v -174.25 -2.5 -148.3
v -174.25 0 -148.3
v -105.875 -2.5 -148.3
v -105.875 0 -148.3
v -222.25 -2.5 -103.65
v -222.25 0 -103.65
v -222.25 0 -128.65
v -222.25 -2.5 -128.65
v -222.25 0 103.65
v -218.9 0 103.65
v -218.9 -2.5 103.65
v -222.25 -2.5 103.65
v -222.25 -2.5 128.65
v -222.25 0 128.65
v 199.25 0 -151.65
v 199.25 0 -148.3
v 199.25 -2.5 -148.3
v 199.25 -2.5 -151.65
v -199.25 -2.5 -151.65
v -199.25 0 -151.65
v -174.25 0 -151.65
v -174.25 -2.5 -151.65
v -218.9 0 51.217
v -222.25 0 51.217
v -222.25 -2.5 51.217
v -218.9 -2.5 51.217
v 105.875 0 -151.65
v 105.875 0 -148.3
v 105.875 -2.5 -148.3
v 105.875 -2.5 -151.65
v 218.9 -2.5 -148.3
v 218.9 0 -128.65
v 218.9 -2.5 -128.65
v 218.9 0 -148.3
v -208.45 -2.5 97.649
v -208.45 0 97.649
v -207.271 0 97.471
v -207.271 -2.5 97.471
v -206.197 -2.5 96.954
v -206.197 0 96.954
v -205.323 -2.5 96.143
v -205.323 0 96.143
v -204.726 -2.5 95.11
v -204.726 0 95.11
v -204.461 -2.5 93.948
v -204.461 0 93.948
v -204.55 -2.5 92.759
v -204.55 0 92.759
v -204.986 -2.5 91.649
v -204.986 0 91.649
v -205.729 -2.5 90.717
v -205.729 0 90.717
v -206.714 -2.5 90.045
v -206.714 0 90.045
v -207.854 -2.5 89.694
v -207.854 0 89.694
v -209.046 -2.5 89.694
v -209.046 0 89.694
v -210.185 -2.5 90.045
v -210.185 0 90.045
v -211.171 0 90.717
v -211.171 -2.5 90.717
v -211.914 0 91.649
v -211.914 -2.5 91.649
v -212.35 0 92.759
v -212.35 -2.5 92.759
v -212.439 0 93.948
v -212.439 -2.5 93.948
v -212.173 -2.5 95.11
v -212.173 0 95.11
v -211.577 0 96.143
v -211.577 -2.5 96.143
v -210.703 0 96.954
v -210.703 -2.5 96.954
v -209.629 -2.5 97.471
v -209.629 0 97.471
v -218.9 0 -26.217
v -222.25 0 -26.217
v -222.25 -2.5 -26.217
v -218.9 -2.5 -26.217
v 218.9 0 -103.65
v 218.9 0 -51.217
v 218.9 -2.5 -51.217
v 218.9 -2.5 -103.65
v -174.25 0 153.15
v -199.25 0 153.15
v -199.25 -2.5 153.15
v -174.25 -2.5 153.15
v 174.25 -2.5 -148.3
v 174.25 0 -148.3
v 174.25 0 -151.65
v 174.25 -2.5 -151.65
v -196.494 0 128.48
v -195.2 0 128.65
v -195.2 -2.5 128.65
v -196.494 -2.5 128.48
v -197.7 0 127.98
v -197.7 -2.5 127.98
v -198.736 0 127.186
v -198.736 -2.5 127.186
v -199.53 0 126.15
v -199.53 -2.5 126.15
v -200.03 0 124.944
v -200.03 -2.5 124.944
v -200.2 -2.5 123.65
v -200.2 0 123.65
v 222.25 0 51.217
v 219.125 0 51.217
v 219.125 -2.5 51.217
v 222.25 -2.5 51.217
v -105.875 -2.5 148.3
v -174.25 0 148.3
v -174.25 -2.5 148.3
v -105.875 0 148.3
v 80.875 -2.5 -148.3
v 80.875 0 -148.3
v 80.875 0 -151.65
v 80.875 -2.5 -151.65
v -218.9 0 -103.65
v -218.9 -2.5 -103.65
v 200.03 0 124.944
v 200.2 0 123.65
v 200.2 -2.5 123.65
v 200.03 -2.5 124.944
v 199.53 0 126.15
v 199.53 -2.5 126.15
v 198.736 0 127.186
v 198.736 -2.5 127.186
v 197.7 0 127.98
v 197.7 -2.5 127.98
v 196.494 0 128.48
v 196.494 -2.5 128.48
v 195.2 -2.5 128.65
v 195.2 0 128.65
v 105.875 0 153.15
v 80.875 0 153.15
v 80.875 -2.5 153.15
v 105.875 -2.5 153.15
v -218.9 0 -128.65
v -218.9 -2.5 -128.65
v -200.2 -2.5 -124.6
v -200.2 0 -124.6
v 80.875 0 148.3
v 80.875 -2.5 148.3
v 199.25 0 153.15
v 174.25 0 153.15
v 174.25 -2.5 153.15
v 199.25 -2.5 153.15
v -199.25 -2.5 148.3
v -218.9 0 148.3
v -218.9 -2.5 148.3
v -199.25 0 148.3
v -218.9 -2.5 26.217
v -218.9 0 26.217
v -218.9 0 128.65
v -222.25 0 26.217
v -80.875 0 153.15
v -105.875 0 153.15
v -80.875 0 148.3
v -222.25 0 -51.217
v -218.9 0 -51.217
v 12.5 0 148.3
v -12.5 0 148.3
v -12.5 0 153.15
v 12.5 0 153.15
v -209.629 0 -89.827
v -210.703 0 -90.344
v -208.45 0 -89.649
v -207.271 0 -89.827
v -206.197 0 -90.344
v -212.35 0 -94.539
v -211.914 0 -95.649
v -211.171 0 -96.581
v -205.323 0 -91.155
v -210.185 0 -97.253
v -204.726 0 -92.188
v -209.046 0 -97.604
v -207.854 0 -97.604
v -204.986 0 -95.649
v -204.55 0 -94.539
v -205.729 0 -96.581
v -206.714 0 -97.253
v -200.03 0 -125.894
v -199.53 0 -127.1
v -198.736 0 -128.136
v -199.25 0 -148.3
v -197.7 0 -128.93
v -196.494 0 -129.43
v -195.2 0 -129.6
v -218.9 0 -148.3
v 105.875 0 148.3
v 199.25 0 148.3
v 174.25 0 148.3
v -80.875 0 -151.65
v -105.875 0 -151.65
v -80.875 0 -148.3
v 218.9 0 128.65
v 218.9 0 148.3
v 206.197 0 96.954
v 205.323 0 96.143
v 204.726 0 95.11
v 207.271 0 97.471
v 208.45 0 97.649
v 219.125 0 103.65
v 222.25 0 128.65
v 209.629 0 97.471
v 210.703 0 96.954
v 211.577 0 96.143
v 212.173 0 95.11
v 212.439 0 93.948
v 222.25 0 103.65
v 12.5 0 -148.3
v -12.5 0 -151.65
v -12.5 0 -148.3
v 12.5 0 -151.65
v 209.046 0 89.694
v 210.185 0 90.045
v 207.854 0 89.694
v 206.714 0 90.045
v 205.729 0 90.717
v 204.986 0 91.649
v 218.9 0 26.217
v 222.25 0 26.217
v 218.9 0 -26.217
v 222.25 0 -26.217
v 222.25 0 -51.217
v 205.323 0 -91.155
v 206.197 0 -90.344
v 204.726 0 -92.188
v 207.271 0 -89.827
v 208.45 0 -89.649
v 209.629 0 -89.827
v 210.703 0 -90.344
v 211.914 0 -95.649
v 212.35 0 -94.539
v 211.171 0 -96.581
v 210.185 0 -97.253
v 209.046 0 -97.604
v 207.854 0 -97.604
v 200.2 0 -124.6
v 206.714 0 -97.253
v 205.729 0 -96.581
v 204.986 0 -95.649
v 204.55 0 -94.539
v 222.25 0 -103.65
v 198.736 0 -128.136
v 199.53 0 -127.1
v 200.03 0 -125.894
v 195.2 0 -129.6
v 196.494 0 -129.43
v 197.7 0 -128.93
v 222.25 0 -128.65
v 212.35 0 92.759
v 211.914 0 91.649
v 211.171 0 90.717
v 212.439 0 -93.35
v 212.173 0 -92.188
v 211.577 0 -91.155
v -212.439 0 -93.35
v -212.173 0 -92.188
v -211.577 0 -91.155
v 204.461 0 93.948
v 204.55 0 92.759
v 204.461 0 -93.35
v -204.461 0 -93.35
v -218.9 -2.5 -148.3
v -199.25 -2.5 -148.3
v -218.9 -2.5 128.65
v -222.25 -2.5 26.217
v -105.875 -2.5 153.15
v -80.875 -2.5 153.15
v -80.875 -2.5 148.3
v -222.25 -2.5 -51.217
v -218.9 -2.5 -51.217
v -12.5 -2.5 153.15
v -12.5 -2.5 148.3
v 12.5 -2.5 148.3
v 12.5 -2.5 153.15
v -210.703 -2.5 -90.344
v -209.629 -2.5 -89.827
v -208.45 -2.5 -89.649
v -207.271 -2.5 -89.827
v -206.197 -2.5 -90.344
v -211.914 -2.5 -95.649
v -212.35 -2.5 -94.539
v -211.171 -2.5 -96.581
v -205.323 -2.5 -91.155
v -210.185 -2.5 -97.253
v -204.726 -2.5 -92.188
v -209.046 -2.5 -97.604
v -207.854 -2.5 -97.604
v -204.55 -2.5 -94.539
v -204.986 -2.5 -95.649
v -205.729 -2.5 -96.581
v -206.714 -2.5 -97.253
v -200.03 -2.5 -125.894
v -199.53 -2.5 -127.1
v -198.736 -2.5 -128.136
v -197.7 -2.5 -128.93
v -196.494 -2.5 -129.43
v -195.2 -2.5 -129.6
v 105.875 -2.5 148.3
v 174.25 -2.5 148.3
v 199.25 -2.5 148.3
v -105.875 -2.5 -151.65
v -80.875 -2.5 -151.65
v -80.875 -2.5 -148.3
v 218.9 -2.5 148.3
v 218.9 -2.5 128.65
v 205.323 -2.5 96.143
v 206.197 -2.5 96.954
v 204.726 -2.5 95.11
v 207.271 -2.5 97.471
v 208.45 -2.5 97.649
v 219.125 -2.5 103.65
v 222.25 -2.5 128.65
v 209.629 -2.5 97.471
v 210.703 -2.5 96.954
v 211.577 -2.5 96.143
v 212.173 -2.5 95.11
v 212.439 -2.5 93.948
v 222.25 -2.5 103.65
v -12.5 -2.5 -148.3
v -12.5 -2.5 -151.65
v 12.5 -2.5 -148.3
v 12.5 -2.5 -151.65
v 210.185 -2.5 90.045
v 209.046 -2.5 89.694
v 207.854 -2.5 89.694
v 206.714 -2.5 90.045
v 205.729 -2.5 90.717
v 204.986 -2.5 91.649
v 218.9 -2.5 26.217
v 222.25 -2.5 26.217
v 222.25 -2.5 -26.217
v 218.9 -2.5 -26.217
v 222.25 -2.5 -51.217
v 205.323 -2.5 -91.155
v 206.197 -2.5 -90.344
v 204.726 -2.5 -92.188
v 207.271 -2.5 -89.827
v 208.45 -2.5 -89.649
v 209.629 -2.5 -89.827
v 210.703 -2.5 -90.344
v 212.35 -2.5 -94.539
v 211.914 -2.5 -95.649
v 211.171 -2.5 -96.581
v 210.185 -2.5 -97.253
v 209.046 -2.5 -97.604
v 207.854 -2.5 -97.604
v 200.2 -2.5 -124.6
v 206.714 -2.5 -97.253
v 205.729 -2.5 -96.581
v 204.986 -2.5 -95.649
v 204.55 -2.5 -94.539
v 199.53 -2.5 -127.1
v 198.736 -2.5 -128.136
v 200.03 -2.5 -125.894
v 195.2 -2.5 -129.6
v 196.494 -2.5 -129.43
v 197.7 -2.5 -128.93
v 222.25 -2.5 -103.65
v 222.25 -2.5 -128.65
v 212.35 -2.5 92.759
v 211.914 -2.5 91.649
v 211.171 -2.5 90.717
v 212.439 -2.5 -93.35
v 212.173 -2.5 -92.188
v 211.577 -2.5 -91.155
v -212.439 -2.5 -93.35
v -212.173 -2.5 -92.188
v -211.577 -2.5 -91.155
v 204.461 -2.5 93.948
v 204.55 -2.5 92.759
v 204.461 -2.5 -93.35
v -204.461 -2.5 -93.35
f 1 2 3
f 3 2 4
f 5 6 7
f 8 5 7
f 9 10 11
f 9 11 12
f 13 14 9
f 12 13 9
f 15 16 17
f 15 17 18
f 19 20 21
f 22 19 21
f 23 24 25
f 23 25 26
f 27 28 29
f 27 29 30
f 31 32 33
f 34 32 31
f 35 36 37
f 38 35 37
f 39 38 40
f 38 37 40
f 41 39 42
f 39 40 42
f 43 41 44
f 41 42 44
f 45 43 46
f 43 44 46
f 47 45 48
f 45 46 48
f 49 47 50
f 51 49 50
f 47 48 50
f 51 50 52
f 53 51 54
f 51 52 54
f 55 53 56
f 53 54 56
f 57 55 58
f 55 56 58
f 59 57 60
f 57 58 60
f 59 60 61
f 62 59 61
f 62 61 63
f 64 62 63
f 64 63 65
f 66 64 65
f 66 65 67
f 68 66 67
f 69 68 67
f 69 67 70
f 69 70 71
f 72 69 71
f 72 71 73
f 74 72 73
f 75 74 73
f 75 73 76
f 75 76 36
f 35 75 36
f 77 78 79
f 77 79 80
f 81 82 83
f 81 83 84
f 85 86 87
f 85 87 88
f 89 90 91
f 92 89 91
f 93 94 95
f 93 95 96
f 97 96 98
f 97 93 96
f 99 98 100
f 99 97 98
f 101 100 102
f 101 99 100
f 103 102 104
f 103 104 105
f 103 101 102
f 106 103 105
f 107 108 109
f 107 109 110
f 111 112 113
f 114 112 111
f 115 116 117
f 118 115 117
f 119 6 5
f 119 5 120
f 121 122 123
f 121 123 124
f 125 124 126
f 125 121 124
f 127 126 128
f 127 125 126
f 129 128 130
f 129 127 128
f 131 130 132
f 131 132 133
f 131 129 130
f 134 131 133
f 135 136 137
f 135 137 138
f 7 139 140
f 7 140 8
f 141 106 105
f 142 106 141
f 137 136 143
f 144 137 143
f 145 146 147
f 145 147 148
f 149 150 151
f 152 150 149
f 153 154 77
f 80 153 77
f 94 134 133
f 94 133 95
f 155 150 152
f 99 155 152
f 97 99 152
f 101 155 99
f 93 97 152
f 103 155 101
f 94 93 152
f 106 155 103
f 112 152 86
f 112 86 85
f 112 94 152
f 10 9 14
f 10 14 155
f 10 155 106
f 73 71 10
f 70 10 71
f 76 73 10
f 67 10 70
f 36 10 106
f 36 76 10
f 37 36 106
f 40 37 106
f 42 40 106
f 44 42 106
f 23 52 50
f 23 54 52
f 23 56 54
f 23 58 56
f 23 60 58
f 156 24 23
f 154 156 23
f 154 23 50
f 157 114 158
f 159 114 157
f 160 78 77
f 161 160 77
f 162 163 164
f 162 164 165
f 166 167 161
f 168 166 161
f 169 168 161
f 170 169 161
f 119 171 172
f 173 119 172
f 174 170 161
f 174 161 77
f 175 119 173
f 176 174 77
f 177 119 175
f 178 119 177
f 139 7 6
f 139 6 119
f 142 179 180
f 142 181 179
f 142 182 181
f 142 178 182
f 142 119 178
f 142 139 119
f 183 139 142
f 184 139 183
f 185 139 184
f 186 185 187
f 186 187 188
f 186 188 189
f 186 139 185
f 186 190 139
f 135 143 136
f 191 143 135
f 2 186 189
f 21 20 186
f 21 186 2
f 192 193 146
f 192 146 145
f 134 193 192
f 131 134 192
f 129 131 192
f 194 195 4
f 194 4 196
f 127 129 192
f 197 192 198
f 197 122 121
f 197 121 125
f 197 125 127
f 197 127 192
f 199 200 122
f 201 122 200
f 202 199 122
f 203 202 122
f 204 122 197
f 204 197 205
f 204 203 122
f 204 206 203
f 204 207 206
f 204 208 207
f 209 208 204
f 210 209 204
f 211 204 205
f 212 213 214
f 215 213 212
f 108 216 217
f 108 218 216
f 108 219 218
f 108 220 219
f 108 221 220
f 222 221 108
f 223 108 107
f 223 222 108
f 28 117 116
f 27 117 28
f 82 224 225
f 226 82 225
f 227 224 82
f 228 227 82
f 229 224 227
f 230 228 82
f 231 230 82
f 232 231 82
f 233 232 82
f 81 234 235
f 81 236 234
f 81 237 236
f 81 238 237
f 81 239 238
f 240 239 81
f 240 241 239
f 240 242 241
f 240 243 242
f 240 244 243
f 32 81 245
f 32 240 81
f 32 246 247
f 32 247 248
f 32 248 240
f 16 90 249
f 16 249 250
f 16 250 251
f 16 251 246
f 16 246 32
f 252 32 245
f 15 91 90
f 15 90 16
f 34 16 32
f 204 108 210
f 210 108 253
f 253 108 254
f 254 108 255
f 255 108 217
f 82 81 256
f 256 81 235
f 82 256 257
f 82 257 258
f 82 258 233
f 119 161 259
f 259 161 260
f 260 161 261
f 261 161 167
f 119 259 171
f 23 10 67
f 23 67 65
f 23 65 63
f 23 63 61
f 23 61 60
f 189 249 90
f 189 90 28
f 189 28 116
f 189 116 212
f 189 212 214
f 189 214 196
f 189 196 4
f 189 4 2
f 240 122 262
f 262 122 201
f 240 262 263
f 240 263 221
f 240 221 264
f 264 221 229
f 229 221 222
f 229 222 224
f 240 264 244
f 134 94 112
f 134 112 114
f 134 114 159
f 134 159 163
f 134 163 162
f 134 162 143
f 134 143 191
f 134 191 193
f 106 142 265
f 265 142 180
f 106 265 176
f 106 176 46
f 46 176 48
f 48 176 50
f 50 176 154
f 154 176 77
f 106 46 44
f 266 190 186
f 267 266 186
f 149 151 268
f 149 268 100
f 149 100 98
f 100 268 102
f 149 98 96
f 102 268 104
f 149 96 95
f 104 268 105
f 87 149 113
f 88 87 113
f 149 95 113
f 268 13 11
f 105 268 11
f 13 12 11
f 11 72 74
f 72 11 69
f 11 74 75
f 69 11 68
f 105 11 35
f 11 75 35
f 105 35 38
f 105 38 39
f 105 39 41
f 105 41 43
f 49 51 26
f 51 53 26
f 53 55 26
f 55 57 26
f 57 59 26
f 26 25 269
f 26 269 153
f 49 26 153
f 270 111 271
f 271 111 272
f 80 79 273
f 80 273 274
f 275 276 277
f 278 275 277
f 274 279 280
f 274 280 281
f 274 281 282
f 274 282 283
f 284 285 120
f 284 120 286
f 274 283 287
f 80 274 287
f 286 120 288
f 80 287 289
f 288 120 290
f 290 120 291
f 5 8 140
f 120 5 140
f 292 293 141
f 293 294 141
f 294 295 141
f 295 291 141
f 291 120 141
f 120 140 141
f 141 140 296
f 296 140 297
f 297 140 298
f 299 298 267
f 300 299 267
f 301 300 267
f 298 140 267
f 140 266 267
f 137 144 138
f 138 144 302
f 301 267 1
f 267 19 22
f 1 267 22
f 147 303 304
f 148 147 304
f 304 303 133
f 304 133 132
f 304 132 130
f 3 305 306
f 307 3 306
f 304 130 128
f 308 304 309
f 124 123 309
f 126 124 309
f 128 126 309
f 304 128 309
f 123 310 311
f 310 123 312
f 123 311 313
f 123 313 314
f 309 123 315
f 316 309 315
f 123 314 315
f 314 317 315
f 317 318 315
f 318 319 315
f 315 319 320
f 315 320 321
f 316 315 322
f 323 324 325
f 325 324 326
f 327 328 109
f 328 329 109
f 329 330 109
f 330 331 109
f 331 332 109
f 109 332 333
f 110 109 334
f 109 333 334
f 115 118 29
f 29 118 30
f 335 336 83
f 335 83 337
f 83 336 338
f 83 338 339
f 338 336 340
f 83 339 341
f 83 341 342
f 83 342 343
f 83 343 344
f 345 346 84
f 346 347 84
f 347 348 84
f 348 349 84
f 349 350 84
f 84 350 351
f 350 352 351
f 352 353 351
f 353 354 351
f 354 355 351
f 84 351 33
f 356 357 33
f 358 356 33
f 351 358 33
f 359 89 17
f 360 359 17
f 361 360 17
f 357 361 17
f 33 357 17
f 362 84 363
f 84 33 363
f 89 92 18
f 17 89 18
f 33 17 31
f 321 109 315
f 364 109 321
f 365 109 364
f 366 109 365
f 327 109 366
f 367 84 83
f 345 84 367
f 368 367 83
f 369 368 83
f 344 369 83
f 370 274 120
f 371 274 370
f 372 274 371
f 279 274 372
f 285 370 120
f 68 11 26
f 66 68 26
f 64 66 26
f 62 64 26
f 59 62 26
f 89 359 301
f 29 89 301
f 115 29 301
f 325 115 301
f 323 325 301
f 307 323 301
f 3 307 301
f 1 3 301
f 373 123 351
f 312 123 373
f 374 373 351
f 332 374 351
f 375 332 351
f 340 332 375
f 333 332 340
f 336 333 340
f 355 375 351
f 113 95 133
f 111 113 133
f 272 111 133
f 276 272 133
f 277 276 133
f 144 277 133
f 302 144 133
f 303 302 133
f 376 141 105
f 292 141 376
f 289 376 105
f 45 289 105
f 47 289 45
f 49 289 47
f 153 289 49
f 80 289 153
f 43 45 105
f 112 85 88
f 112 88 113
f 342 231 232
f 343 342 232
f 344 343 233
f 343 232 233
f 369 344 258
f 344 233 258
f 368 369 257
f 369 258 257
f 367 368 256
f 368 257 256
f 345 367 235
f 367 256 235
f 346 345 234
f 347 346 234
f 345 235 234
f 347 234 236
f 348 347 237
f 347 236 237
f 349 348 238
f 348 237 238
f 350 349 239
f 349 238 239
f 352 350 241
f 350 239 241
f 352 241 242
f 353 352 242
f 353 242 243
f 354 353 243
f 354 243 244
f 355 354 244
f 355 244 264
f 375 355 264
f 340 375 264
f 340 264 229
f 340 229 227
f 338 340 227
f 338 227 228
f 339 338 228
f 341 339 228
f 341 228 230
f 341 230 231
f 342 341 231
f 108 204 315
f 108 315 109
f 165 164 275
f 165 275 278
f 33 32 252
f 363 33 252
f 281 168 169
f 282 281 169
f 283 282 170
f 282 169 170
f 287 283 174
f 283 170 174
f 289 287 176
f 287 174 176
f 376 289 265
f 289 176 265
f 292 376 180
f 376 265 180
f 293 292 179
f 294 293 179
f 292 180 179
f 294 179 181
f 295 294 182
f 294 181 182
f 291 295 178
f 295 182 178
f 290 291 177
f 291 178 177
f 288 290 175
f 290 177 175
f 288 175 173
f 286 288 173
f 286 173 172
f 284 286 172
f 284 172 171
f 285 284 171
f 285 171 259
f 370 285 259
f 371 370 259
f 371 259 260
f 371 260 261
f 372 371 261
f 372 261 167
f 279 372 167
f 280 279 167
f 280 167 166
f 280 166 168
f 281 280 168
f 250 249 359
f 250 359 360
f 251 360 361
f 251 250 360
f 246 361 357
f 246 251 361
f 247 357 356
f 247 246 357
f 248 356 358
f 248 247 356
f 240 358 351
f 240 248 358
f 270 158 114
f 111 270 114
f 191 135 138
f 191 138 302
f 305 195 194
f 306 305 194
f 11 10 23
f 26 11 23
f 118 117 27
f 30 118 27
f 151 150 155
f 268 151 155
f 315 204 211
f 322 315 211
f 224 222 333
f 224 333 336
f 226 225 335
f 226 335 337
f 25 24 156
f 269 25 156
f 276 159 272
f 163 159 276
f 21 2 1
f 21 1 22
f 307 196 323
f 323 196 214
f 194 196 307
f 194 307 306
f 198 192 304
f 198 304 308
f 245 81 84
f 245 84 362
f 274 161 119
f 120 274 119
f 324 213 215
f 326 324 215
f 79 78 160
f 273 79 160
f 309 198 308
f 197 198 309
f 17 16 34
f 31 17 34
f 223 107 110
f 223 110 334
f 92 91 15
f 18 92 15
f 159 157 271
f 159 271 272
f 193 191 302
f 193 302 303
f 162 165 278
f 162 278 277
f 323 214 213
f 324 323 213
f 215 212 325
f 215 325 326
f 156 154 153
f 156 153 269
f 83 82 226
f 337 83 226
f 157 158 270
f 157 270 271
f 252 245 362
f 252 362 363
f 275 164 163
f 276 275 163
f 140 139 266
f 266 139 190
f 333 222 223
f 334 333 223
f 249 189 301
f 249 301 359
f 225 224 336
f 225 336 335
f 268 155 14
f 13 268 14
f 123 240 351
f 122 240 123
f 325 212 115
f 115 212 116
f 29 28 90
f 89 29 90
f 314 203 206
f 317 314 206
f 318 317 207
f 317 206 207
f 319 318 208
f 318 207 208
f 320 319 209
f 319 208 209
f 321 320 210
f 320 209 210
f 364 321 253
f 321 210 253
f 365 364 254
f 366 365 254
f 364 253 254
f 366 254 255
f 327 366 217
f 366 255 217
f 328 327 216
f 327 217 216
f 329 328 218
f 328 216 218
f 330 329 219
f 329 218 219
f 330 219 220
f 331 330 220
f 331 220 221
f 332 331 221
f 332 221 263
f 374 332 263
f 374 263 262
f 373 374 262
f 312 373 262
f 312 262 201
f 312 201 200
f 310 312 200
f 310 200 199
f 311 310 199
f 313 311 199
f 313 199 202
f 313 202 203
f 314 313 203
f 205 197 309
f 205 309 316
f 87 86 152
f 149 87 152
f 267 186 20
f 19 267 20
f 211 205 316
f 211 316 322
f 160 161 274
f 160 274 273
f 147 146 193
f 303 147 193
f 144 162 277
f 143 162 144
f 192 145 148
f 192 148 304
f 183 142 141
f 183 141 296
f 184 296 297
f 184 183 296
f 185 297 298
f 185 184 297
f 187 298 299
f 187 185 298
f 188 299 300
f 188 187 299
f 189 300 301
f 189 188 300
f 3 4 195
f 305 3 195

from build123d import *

# Parameters (mm, degrees)
SKETCH1_W           = 438.5
SKETCH1_H           = 297.3
BASE_FLANGE1_DEPTH  = 2.5
SKETCH6_W           = 3
SKETCH6_H           = 25
BOSS_EXTRUDE1_DEPTH = 2.5
SKETCH8_W           = 25
SKETCH8_H           = 4.5
BOSS_EXTRUDE2_DEPTH = 2.5
SKETCH9_W           = 25
SKETCH9_H           = 3
BOSS_EXTRUDE3_DEPTH = 2.5
SKETCH10_W          = 0.35
SKETCH10_H          = 19.65
SKETCH10_W_2        = 20
SKETCH10_H_2        = 0.35
SKETCH10_H_3        = 52.4334
SKETCH10_H_4        = 20
SKETCH10_W_3        = 19.65
SKETCH10_W_4        = 68.375
SKETCH10_W_5        = 0.125
SKETCH10_H_5        = 52.4333
CUT_EXTRUDE1_DEPTH  = 10
SKETCH11_R          = 4
CUT_EXTRUDE2_DEPTH  = 3.05


# Sheet-metal steps are written as plain solids
with BuildPart() as part:
    # Sketch1 → Base-Flange1 (new body)
    with BuildSketch(Plane(origin=(0, 0, 0), x_dir=(1, 0, 0), z_dir=(0, 1, 0))):
        Rectangle(SKETCH1_W, SKETCH1_H)
        with BuildLine():
            Line((-195.2, 129.6), (195.2, 129.6))
            ThreePointArc((195.2, 129.6), (198.735533906, 128.135533906), (200.2, 124.6))
            Line((200.2, 124.6), (200.2, -123.65))
            ThreePointArc((200.2, -123.65), (198.735533906, -127.185533906), (195.2, -128.65))
            Line((195.2, -128.65), (-195.2, -128.65))
            ThreePointArc((-195.2, -128.65), (-198.735533906, -127.185533906), (-200.2, -123.65))
            Line((-200.2, -123.65), (-200.2, 124.6))
            ThreePointArc((-200.2, 124.6), (-198.735533906, 128.135533906), (-195.2, 129.6))
        make_face(mode=Mode.SUBTRACT)
    extrude(amount=-BASE_FLANGE1_DEPTH)

    # Sketch6 → Boss-Extrude1 (add)
    with BuildSketch(Plane(origin=(0, 0, 0), x_dir=(1, 0, 0), z_dir=(0, 1, 0))):
        with Locations((220.75, -116.15)):
            Rectangle(SKETCH6_W, SKETCH6_H)
        with Locations((220.75, -38.7166)):
            Rectangle(SKETCH6_W, SKETCH6_H)
        with Locations((220.75, 38.7167)):
            Rectangle(SKETCH6_W, SKETCH6_H)
        with Locations((220.75, 116.15)):
            Rectangle(SKETCH6_W, SKETCH6_H)
    boss_extrude1 = extrude(amount=-BOSS_EXTRUDE1_DEPTH)

    # Mirror1: Boss-Extrude1 across plane
    add(boss_extrude1.mirror(Plane(origin=(0, 0, 0), x_dir=(0, 0, 1), z_dir=(1, 0, 0))))

    # Sketch8 → Boss-Extrude2 (add)
    with BuildSketch(Plane(origin=(0, 0, 0), x_dir=(1, 0, 0), z_dir=(0, 1, 0))):
        with Locations((-186.75, -150.9)):
            Rectangle(SKETCH8_W, SKETCH8_H)
        with Locations((93.375, -150.9)):
            Rectangle(SKETCH8_W, SKETCH8_H)
        with Locations((-93.375, -150.9)):
            Rectangle(SKETCH8_W, SKETCH8_H)
        with Locations((0, -150.9)):
            Rectangle(SKETCH8_W, SKETCH8_H)
        with Locations((186.75, -150.9)):
            Rectangle(SKETCH8_W, SKETCH8_H)
    extrude(amount=-BOSS_EXTRUDE2_DEPTH)

    # Sketch9 → Boss-Extrude3 (add)
    with BuildSketch(Plane(origin=(0, 0, 0), x_dir=(1, 0, 0), z_dir=(0, 1, 0))):
        with Locations((-186.75, 150.15)):
            Rectangle(SKETCH9_W, SKETCH9_H)
        with Locations((-93.375, 150.15)):
            Rectangle(SKETCH9_W, SKETCH9_H)
        with Locations((0, 150.15)):
            Rectangle(SKETCH9_W, SKETCH9_H)
        with Locations((93.375, 150.15)):
            Rectangle(SKETCH9_W, SKETCH9_H)
        with Locations((186.75, 150.15)):
            Rectangle(SKETCH9_W, SKETCH9_H)
    extrude(amount=-BOSS_EXTRUDE3_DEPTH)

    # Sketch10 → Cut-Extrude1 (cut)
    with BuildSketch(Plane(origin=(0, 0, 0), x_dir=(1, 0, 0), z_dir=(0, 1, 0))):
        with Locations((219.075, 138.475)):
            Rectangle(SKETCH10_W, SKETCH10_H)
        with Locations((209.25, 148.475)):
            Rectangle(SKETCH10_W_2, SKETCH10_H_2)
        with Locations((-219.075, -77.4333)):
            Rectangle(SKETCH10_W, SKETCH10_H_3)
        with Locations((-219.075, -138.65)):
            Rectangle(SKETCH10_W, SKETCH10_H_4)
        with Locations((-209.075, -148.475)):
            Rectangle(SKETCH10_W_3, SKETCH10_H_2)
        with Locations((-140.0625, -148.475)):
            Rectangle(SKETCH10_W_4, SKETCH10_H_2)
        with Locations((-46.6875, -148.475)):
            Rectangle(SKETCH10_W_4, SKETCH10_H_2)
        with Locations((46.6875, -148.475)):
            Rectangle(SKETCH10_W_4, SKETCH10_H_2)
        with Locations((140.0625, -148.475)):
            Rectangle(SKETCH10_W_4, SKETCH10_H_2)
        with Locations((209.25, -148.475)):
            Rectangle(SKETCH10_W_2, SKETCH10_H_2)
        with Locations((219.075, -138.475)):
            Rectangle(SKETCH10_W, SKETCH10_H)
        with Locations((219.1875, -77.4333)):
            Rectangle(SKETCH10_W_5, SKETCH10_H_3)
        with Locations((219.075, 5e-05)):
            Rectangle(SKETCH10_W, SKETCH10_H_5)
        with Locations((219.075, 77.43335)):
            Rectangle(SKETCH10_W, SKETCH10_H_5)
        with Locations((140.0625, 148.475)):
            Rectangle(SKETCH10_W_4, SKETCH10_H_2)
        with Locations((46.6875, 148.475)):
            Rectangle(SKETCH10_W_4, SKETCH10_H_2)
        with Locations((-46.6875, 148.475)):
            Rectangle(SKETCH10_W_4, SKETCH10_H_2)
        with Locations((-209.25, 148.475)):
            Rectangle(SKETCH10_W_2, SKETCH10_H_2)
        with Locations((-140.0625, 148.475)):
            Rectangle(SKETCH10_W_4, SKETCH10_H_2)
        with Locations((-219.075, 138.475)):
            Rectangle(SKETCH10_W, SKETCH10_H)
        with Locations((-219.075, 77.43335)):
            Rectangle(SKETCH10_W, SKETCH10_H_5)
        with Locations((-219.075, 5e-05)):
            Rectangle(SKETCH10_W, SKETCH10_H_5)
    extrude(amount=-CUT_EXTRUDE1_DEPTH, mode=Mode.SUBTRACT)

    # Sketch11 → Cut-Extrude2 (cut)
    with BuildSketch(Plane(origin=(0, 0, 0), x_dir=(1, 0, 0), z_dir=(0, 1, 0))):
        with Locations(Location((-208.44992, 93.649, 0), (0, 0, 270))):
            Circle(SKETCH11_R)
        with Locations(Location((208.44992, 93.649, 0), (0, 0, 270))):
            Circle(SKETCH11_R)
        with Locations(Location((208.44992, -93.649, 0), (0, 0, 270))):
            Circle(SKETCH11_R)
        with Locations(Location((-208.44992, -93.649, 0), (0, 0, 270))):
            Circle(SKETCH11_R)
    extrude(amount=-CUT_EXTRUDE2_DEPTH, mode=Mode.SUBTRACT)


solid = part.part
